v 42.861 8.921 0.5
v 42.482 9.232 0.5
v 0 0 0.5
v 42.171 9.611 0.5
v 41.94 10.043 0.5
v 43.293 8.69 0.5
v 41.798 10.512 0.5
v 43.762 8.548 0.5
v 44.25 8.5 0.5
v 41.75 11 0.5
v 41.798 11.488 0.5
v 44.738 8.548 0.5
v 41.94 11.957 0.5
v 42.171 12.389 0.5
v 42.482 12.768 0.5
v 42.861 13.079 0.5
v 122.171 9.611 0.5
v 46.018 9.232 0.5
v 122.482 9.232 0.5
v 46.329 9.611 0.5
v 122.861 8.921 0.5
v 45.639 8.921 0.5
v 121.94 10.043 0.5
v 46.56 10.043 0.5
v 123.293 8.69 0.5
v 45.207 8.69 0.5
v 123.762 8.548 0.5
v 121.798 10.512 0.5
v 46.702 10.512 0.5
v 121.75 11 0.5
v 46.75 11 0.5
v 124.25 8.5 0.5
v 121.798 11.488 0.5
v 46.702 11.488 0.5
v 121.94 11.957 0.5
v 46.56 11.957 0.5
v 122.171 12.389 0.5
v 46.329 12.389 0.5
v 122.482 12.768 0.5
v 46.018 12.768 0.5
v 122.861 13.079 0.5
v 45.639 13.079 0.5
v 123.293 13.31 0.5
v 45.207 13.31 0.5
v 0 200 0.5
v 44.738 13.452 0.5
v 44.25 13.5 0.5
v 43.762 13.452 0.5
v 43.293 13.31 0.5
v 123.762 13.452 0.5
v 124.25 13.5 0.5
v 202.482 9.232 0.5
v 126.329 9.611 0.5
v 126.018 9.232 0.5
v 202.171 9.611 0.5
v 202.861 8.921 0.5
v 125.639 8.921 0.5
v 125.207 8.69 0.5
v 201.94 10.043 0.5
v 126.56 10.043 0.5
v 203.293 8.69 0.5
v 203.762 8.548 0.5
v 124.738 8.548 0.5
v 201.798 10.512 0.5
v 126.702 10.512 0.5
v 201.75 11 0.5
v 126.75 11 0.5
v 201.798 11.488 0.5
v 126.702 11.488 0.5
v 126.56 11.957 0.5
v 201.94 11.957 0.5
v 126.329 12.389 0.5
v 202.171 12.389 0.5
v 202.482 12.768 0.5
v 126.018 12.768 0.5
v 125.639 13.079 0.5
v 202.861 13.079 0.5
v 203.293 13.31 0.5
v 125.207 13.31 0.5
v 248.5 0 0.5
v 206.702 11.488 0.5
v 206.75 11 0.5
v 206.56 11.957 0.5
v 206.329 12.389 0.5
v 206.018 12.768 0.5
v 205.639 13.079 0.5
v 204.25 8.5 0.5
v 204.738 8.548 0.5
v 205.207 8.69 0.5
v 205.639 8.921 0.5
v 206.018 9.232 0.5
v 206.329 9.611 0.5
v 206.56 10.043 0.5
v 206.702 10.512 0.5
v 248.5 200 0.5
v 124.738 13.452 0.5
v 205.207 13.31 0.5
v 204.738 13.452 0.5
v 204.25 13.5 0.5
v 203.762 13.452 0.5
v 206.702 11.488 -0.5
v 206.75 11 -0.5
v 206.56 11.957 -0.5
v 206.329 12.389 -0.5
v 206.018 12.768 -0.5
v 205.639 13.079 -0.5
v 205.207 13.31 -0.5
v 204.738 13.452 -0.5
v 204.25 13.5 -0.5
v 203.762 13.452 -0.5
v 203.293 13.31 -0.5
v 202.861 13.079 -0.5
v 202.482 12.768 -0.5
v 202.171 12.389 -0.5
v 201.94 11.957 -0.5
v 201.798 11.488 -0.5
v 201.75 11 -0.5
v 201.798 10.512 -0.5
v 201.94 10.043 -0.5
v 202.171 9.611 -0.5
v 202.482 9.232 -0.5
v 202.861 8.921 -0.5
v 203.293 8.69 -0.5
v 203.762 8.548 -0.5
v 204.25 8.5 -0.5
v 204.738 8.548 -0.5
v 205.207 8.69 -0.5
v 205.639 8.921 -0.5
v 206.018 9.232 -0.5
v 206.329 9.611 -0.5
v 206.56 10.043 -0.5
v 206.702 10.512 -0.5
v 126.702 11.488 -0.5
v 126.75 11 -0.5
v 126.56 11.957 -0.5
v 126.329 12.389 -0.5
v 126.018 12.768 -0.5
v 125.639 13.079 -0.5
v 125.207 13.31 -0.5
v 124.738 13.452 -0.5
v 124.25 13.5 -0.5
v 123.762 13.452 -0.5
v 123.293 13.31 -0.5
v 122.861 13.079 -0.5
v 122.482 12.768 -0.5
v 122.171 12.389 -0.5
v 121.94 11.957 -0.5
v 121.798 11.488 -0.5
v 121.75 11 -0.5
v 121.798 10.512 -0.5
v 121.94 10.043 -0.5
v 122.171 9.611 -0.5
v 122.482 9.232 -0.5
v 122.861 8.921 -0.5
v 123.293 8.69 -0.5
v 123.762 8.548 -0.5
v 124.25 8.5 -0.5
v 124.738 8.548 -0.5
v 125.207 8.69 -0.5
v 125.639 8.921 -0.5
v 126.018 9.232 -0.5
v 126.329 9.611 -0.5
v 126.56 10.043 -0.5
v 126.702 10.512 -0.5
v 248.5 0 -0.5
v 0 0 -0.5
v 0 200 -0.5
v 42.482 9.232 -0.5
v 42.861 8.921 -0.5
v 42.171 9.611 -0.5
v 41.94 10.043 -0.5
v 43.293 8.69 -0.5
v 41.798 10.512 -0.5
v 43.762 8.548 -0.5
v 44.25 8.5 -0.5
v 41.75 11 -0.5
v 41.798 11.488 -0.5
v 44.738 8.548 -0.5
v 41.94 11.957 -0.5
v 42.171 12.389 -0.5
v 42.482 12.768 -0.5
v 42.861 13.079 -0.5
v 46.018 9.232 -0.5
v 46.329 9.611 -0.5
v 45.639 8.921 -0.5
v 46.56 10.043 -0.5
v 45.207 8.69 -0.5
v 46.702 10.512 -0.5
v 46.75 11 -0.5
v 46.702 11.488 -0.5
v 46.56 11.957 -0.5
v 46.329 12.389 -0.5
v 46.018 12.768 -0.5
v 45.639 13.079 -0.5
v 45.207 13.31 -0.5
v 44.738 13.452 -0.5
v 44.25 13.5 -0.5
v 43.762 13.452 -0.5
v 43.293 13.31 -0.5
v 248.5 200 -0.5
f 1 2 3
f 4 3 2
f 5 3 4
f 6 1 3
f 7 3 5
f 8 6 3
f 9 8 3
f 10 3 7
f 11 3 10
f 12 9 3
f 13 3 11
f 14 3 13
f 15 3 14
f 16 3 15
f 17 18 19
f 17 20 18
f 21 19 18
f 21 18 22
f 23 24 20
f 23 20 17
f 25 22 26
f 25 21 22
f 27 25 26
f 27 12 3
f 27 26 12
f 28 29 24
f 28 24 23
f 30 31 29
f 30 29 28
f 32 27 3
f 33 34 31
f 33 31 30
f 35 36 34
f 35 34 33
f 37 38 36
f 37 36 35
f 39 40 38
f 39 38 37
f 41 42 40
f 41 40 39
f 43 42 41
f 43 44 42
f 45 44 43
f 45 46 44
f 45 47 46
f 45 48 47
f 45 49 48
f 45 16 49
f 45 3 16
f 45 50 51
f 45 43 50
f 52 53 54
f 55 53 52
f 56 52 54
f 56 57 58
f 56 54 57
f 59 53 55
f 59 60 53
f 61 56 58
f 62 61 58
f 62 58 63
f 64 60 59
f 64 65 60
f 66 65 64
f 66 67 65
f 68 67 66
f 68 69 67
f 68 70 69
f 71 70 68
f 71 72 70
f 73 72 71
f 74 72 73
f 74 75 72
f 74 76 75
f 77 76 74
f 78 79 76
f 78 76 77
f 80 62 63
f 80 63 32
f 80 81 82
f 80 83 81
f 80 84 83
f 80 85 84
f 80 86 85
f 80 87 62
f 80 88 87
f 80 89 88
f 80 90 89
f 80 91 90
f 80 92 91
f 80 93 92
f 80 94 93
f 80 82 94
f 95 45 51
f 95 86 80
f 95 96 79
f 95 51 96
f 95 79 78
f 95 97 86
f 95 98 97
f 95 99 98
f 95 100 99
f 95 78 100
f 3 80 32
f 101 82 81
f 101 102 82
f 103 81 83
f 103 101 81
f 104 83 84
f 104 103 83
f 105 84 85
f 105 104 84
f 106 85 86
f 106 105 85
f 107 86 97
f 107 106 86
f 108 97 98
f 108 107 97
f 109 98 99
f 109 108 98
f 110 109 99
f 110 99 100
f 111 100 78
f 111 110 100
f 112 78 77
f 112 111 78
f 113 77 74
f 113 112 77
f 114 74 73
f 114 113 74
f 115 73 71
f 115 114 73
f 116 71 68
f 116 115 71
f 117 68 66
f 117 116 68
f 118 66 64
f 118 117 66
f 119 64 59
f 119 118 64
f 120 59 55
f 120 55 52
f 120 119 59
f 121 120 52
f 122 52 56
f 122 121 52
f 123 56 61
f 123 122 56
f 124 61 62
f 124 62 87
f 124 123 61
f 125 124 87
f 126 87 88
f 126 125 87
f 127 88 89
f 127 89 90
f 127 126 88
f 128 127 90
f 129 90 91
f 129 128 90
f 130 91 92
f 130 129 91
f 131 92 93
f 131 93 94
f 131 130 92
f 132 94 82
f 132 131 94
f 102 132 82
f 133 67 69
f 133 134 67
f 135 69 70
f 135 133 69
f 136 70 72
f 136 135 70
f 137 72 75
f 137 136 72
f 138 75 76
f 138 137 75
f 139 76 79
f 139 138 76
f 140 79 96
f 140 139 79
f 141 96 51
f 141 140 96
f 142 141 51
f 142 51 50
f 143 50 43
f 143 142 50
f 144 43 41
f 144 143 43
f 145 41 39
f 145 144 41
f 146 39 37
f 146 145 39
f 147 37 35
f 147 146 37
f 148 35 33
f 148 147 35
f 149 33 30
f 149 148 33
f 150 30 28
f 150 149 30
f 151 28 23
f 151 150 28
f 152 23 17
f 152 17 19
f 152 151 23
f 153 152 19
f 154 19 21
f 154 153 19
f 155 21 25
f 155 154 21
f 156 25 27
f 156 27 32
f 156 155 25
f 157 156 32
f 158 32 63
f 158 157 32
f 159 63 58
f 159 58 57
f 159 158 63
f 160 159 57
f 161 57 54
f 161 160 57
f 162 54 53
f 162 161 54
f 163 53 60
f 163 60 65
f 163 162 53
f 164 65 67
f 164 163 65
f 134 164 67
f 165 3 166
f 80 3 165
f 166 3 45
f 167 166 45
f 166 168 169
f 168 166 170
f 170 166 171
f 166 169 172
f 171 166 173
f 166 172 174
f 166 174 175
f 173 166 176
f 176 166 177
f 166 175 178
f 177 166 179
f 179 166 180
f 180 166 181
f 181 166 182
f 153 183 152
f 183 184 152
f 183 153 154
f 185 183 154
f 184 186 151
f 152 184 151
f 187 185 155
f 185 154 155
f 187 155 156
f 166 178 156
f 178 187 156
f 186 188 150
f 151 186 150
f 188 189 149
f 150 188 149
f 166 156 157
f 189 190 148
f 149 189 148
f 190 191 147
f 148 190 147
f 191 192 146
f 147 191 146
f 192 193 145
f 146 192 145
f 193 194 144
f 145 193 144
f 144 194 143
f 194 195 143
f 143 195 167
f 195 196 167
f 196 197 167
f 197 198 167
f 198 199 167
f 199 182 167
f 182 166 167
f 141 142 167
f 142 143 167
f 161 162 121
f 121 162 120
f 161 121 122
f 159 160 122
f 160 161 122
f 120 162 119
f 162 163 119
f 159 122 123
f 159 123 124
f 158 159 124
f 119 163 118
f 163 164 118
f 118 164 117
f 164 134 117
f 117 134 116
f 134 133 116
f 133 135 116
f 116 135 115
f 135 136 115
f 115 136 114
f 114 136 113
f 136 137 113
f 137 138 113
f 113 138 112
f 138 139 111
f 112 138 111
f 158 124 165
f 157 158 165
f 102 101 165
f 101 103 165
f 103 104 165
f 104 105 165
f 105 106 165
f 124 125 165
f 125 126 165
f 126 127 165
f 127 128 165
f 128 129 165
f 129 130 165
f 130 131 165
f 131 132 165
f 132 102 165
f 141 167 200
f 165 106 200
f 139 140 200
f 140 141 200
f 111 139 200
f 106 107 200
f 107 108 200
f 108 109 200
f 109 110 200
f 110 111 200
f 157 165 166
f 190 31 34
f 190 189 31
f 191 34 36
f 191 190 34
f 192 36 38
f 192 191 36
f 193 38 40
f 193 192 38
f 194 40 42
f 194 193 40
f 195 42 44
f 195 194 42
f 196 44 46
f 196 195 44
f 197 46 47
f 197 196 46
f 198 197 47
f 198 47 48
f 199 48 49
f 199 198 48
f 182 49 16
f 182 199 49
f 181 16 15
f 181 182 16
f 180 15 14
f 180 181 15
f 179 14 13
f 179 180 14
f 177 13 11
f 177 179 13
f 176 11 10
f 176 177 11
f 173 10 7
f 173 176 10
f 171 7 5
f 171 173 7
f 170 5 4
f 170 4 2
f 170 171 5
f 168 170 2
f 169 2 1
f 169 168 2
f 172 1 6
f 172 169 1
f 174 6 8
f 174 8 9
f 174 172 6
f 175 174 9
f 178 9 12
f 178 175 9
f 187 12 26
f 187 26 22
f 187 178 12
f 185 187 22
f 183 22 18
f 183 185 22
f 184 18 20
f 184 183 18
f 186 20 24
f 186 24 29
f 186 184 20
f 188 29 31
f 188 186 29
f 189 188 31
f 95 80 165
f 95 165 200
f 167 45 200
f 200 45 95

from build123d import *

# Parameters (mm, degrees)
SKETCH_1_W      = 248.5
SKETCH_1_H      = 200
SKETCH_1_R      = 2.5
EXTRUDE_1_DEPTH = 0.5


with BuildPart() as part:
    # 스케치1 → 보스-돌출1 (new, symmetric)
    with BuildSketch(Plane.XY):
        with Locations((124.25, 100)):
            Rectangle(SKETCH_1_W, SKETCH_1_H)
        with Locations((124.25, 11)):
            Circle(SKETCH_1_R, mode=Mode.SUBTRACT)
        with Locations((204.25, 11)):
            Circle(SKETCH_1_R, mode=Mode.SUBTRACT)
        with Locations((44.25, 11)):
            Circle(SKETCH_1_R, mode=Mode.SUBTRACT)
    extrude(amount=EXTRUDE_1_DEPTH, both=True)


solid = part.part
